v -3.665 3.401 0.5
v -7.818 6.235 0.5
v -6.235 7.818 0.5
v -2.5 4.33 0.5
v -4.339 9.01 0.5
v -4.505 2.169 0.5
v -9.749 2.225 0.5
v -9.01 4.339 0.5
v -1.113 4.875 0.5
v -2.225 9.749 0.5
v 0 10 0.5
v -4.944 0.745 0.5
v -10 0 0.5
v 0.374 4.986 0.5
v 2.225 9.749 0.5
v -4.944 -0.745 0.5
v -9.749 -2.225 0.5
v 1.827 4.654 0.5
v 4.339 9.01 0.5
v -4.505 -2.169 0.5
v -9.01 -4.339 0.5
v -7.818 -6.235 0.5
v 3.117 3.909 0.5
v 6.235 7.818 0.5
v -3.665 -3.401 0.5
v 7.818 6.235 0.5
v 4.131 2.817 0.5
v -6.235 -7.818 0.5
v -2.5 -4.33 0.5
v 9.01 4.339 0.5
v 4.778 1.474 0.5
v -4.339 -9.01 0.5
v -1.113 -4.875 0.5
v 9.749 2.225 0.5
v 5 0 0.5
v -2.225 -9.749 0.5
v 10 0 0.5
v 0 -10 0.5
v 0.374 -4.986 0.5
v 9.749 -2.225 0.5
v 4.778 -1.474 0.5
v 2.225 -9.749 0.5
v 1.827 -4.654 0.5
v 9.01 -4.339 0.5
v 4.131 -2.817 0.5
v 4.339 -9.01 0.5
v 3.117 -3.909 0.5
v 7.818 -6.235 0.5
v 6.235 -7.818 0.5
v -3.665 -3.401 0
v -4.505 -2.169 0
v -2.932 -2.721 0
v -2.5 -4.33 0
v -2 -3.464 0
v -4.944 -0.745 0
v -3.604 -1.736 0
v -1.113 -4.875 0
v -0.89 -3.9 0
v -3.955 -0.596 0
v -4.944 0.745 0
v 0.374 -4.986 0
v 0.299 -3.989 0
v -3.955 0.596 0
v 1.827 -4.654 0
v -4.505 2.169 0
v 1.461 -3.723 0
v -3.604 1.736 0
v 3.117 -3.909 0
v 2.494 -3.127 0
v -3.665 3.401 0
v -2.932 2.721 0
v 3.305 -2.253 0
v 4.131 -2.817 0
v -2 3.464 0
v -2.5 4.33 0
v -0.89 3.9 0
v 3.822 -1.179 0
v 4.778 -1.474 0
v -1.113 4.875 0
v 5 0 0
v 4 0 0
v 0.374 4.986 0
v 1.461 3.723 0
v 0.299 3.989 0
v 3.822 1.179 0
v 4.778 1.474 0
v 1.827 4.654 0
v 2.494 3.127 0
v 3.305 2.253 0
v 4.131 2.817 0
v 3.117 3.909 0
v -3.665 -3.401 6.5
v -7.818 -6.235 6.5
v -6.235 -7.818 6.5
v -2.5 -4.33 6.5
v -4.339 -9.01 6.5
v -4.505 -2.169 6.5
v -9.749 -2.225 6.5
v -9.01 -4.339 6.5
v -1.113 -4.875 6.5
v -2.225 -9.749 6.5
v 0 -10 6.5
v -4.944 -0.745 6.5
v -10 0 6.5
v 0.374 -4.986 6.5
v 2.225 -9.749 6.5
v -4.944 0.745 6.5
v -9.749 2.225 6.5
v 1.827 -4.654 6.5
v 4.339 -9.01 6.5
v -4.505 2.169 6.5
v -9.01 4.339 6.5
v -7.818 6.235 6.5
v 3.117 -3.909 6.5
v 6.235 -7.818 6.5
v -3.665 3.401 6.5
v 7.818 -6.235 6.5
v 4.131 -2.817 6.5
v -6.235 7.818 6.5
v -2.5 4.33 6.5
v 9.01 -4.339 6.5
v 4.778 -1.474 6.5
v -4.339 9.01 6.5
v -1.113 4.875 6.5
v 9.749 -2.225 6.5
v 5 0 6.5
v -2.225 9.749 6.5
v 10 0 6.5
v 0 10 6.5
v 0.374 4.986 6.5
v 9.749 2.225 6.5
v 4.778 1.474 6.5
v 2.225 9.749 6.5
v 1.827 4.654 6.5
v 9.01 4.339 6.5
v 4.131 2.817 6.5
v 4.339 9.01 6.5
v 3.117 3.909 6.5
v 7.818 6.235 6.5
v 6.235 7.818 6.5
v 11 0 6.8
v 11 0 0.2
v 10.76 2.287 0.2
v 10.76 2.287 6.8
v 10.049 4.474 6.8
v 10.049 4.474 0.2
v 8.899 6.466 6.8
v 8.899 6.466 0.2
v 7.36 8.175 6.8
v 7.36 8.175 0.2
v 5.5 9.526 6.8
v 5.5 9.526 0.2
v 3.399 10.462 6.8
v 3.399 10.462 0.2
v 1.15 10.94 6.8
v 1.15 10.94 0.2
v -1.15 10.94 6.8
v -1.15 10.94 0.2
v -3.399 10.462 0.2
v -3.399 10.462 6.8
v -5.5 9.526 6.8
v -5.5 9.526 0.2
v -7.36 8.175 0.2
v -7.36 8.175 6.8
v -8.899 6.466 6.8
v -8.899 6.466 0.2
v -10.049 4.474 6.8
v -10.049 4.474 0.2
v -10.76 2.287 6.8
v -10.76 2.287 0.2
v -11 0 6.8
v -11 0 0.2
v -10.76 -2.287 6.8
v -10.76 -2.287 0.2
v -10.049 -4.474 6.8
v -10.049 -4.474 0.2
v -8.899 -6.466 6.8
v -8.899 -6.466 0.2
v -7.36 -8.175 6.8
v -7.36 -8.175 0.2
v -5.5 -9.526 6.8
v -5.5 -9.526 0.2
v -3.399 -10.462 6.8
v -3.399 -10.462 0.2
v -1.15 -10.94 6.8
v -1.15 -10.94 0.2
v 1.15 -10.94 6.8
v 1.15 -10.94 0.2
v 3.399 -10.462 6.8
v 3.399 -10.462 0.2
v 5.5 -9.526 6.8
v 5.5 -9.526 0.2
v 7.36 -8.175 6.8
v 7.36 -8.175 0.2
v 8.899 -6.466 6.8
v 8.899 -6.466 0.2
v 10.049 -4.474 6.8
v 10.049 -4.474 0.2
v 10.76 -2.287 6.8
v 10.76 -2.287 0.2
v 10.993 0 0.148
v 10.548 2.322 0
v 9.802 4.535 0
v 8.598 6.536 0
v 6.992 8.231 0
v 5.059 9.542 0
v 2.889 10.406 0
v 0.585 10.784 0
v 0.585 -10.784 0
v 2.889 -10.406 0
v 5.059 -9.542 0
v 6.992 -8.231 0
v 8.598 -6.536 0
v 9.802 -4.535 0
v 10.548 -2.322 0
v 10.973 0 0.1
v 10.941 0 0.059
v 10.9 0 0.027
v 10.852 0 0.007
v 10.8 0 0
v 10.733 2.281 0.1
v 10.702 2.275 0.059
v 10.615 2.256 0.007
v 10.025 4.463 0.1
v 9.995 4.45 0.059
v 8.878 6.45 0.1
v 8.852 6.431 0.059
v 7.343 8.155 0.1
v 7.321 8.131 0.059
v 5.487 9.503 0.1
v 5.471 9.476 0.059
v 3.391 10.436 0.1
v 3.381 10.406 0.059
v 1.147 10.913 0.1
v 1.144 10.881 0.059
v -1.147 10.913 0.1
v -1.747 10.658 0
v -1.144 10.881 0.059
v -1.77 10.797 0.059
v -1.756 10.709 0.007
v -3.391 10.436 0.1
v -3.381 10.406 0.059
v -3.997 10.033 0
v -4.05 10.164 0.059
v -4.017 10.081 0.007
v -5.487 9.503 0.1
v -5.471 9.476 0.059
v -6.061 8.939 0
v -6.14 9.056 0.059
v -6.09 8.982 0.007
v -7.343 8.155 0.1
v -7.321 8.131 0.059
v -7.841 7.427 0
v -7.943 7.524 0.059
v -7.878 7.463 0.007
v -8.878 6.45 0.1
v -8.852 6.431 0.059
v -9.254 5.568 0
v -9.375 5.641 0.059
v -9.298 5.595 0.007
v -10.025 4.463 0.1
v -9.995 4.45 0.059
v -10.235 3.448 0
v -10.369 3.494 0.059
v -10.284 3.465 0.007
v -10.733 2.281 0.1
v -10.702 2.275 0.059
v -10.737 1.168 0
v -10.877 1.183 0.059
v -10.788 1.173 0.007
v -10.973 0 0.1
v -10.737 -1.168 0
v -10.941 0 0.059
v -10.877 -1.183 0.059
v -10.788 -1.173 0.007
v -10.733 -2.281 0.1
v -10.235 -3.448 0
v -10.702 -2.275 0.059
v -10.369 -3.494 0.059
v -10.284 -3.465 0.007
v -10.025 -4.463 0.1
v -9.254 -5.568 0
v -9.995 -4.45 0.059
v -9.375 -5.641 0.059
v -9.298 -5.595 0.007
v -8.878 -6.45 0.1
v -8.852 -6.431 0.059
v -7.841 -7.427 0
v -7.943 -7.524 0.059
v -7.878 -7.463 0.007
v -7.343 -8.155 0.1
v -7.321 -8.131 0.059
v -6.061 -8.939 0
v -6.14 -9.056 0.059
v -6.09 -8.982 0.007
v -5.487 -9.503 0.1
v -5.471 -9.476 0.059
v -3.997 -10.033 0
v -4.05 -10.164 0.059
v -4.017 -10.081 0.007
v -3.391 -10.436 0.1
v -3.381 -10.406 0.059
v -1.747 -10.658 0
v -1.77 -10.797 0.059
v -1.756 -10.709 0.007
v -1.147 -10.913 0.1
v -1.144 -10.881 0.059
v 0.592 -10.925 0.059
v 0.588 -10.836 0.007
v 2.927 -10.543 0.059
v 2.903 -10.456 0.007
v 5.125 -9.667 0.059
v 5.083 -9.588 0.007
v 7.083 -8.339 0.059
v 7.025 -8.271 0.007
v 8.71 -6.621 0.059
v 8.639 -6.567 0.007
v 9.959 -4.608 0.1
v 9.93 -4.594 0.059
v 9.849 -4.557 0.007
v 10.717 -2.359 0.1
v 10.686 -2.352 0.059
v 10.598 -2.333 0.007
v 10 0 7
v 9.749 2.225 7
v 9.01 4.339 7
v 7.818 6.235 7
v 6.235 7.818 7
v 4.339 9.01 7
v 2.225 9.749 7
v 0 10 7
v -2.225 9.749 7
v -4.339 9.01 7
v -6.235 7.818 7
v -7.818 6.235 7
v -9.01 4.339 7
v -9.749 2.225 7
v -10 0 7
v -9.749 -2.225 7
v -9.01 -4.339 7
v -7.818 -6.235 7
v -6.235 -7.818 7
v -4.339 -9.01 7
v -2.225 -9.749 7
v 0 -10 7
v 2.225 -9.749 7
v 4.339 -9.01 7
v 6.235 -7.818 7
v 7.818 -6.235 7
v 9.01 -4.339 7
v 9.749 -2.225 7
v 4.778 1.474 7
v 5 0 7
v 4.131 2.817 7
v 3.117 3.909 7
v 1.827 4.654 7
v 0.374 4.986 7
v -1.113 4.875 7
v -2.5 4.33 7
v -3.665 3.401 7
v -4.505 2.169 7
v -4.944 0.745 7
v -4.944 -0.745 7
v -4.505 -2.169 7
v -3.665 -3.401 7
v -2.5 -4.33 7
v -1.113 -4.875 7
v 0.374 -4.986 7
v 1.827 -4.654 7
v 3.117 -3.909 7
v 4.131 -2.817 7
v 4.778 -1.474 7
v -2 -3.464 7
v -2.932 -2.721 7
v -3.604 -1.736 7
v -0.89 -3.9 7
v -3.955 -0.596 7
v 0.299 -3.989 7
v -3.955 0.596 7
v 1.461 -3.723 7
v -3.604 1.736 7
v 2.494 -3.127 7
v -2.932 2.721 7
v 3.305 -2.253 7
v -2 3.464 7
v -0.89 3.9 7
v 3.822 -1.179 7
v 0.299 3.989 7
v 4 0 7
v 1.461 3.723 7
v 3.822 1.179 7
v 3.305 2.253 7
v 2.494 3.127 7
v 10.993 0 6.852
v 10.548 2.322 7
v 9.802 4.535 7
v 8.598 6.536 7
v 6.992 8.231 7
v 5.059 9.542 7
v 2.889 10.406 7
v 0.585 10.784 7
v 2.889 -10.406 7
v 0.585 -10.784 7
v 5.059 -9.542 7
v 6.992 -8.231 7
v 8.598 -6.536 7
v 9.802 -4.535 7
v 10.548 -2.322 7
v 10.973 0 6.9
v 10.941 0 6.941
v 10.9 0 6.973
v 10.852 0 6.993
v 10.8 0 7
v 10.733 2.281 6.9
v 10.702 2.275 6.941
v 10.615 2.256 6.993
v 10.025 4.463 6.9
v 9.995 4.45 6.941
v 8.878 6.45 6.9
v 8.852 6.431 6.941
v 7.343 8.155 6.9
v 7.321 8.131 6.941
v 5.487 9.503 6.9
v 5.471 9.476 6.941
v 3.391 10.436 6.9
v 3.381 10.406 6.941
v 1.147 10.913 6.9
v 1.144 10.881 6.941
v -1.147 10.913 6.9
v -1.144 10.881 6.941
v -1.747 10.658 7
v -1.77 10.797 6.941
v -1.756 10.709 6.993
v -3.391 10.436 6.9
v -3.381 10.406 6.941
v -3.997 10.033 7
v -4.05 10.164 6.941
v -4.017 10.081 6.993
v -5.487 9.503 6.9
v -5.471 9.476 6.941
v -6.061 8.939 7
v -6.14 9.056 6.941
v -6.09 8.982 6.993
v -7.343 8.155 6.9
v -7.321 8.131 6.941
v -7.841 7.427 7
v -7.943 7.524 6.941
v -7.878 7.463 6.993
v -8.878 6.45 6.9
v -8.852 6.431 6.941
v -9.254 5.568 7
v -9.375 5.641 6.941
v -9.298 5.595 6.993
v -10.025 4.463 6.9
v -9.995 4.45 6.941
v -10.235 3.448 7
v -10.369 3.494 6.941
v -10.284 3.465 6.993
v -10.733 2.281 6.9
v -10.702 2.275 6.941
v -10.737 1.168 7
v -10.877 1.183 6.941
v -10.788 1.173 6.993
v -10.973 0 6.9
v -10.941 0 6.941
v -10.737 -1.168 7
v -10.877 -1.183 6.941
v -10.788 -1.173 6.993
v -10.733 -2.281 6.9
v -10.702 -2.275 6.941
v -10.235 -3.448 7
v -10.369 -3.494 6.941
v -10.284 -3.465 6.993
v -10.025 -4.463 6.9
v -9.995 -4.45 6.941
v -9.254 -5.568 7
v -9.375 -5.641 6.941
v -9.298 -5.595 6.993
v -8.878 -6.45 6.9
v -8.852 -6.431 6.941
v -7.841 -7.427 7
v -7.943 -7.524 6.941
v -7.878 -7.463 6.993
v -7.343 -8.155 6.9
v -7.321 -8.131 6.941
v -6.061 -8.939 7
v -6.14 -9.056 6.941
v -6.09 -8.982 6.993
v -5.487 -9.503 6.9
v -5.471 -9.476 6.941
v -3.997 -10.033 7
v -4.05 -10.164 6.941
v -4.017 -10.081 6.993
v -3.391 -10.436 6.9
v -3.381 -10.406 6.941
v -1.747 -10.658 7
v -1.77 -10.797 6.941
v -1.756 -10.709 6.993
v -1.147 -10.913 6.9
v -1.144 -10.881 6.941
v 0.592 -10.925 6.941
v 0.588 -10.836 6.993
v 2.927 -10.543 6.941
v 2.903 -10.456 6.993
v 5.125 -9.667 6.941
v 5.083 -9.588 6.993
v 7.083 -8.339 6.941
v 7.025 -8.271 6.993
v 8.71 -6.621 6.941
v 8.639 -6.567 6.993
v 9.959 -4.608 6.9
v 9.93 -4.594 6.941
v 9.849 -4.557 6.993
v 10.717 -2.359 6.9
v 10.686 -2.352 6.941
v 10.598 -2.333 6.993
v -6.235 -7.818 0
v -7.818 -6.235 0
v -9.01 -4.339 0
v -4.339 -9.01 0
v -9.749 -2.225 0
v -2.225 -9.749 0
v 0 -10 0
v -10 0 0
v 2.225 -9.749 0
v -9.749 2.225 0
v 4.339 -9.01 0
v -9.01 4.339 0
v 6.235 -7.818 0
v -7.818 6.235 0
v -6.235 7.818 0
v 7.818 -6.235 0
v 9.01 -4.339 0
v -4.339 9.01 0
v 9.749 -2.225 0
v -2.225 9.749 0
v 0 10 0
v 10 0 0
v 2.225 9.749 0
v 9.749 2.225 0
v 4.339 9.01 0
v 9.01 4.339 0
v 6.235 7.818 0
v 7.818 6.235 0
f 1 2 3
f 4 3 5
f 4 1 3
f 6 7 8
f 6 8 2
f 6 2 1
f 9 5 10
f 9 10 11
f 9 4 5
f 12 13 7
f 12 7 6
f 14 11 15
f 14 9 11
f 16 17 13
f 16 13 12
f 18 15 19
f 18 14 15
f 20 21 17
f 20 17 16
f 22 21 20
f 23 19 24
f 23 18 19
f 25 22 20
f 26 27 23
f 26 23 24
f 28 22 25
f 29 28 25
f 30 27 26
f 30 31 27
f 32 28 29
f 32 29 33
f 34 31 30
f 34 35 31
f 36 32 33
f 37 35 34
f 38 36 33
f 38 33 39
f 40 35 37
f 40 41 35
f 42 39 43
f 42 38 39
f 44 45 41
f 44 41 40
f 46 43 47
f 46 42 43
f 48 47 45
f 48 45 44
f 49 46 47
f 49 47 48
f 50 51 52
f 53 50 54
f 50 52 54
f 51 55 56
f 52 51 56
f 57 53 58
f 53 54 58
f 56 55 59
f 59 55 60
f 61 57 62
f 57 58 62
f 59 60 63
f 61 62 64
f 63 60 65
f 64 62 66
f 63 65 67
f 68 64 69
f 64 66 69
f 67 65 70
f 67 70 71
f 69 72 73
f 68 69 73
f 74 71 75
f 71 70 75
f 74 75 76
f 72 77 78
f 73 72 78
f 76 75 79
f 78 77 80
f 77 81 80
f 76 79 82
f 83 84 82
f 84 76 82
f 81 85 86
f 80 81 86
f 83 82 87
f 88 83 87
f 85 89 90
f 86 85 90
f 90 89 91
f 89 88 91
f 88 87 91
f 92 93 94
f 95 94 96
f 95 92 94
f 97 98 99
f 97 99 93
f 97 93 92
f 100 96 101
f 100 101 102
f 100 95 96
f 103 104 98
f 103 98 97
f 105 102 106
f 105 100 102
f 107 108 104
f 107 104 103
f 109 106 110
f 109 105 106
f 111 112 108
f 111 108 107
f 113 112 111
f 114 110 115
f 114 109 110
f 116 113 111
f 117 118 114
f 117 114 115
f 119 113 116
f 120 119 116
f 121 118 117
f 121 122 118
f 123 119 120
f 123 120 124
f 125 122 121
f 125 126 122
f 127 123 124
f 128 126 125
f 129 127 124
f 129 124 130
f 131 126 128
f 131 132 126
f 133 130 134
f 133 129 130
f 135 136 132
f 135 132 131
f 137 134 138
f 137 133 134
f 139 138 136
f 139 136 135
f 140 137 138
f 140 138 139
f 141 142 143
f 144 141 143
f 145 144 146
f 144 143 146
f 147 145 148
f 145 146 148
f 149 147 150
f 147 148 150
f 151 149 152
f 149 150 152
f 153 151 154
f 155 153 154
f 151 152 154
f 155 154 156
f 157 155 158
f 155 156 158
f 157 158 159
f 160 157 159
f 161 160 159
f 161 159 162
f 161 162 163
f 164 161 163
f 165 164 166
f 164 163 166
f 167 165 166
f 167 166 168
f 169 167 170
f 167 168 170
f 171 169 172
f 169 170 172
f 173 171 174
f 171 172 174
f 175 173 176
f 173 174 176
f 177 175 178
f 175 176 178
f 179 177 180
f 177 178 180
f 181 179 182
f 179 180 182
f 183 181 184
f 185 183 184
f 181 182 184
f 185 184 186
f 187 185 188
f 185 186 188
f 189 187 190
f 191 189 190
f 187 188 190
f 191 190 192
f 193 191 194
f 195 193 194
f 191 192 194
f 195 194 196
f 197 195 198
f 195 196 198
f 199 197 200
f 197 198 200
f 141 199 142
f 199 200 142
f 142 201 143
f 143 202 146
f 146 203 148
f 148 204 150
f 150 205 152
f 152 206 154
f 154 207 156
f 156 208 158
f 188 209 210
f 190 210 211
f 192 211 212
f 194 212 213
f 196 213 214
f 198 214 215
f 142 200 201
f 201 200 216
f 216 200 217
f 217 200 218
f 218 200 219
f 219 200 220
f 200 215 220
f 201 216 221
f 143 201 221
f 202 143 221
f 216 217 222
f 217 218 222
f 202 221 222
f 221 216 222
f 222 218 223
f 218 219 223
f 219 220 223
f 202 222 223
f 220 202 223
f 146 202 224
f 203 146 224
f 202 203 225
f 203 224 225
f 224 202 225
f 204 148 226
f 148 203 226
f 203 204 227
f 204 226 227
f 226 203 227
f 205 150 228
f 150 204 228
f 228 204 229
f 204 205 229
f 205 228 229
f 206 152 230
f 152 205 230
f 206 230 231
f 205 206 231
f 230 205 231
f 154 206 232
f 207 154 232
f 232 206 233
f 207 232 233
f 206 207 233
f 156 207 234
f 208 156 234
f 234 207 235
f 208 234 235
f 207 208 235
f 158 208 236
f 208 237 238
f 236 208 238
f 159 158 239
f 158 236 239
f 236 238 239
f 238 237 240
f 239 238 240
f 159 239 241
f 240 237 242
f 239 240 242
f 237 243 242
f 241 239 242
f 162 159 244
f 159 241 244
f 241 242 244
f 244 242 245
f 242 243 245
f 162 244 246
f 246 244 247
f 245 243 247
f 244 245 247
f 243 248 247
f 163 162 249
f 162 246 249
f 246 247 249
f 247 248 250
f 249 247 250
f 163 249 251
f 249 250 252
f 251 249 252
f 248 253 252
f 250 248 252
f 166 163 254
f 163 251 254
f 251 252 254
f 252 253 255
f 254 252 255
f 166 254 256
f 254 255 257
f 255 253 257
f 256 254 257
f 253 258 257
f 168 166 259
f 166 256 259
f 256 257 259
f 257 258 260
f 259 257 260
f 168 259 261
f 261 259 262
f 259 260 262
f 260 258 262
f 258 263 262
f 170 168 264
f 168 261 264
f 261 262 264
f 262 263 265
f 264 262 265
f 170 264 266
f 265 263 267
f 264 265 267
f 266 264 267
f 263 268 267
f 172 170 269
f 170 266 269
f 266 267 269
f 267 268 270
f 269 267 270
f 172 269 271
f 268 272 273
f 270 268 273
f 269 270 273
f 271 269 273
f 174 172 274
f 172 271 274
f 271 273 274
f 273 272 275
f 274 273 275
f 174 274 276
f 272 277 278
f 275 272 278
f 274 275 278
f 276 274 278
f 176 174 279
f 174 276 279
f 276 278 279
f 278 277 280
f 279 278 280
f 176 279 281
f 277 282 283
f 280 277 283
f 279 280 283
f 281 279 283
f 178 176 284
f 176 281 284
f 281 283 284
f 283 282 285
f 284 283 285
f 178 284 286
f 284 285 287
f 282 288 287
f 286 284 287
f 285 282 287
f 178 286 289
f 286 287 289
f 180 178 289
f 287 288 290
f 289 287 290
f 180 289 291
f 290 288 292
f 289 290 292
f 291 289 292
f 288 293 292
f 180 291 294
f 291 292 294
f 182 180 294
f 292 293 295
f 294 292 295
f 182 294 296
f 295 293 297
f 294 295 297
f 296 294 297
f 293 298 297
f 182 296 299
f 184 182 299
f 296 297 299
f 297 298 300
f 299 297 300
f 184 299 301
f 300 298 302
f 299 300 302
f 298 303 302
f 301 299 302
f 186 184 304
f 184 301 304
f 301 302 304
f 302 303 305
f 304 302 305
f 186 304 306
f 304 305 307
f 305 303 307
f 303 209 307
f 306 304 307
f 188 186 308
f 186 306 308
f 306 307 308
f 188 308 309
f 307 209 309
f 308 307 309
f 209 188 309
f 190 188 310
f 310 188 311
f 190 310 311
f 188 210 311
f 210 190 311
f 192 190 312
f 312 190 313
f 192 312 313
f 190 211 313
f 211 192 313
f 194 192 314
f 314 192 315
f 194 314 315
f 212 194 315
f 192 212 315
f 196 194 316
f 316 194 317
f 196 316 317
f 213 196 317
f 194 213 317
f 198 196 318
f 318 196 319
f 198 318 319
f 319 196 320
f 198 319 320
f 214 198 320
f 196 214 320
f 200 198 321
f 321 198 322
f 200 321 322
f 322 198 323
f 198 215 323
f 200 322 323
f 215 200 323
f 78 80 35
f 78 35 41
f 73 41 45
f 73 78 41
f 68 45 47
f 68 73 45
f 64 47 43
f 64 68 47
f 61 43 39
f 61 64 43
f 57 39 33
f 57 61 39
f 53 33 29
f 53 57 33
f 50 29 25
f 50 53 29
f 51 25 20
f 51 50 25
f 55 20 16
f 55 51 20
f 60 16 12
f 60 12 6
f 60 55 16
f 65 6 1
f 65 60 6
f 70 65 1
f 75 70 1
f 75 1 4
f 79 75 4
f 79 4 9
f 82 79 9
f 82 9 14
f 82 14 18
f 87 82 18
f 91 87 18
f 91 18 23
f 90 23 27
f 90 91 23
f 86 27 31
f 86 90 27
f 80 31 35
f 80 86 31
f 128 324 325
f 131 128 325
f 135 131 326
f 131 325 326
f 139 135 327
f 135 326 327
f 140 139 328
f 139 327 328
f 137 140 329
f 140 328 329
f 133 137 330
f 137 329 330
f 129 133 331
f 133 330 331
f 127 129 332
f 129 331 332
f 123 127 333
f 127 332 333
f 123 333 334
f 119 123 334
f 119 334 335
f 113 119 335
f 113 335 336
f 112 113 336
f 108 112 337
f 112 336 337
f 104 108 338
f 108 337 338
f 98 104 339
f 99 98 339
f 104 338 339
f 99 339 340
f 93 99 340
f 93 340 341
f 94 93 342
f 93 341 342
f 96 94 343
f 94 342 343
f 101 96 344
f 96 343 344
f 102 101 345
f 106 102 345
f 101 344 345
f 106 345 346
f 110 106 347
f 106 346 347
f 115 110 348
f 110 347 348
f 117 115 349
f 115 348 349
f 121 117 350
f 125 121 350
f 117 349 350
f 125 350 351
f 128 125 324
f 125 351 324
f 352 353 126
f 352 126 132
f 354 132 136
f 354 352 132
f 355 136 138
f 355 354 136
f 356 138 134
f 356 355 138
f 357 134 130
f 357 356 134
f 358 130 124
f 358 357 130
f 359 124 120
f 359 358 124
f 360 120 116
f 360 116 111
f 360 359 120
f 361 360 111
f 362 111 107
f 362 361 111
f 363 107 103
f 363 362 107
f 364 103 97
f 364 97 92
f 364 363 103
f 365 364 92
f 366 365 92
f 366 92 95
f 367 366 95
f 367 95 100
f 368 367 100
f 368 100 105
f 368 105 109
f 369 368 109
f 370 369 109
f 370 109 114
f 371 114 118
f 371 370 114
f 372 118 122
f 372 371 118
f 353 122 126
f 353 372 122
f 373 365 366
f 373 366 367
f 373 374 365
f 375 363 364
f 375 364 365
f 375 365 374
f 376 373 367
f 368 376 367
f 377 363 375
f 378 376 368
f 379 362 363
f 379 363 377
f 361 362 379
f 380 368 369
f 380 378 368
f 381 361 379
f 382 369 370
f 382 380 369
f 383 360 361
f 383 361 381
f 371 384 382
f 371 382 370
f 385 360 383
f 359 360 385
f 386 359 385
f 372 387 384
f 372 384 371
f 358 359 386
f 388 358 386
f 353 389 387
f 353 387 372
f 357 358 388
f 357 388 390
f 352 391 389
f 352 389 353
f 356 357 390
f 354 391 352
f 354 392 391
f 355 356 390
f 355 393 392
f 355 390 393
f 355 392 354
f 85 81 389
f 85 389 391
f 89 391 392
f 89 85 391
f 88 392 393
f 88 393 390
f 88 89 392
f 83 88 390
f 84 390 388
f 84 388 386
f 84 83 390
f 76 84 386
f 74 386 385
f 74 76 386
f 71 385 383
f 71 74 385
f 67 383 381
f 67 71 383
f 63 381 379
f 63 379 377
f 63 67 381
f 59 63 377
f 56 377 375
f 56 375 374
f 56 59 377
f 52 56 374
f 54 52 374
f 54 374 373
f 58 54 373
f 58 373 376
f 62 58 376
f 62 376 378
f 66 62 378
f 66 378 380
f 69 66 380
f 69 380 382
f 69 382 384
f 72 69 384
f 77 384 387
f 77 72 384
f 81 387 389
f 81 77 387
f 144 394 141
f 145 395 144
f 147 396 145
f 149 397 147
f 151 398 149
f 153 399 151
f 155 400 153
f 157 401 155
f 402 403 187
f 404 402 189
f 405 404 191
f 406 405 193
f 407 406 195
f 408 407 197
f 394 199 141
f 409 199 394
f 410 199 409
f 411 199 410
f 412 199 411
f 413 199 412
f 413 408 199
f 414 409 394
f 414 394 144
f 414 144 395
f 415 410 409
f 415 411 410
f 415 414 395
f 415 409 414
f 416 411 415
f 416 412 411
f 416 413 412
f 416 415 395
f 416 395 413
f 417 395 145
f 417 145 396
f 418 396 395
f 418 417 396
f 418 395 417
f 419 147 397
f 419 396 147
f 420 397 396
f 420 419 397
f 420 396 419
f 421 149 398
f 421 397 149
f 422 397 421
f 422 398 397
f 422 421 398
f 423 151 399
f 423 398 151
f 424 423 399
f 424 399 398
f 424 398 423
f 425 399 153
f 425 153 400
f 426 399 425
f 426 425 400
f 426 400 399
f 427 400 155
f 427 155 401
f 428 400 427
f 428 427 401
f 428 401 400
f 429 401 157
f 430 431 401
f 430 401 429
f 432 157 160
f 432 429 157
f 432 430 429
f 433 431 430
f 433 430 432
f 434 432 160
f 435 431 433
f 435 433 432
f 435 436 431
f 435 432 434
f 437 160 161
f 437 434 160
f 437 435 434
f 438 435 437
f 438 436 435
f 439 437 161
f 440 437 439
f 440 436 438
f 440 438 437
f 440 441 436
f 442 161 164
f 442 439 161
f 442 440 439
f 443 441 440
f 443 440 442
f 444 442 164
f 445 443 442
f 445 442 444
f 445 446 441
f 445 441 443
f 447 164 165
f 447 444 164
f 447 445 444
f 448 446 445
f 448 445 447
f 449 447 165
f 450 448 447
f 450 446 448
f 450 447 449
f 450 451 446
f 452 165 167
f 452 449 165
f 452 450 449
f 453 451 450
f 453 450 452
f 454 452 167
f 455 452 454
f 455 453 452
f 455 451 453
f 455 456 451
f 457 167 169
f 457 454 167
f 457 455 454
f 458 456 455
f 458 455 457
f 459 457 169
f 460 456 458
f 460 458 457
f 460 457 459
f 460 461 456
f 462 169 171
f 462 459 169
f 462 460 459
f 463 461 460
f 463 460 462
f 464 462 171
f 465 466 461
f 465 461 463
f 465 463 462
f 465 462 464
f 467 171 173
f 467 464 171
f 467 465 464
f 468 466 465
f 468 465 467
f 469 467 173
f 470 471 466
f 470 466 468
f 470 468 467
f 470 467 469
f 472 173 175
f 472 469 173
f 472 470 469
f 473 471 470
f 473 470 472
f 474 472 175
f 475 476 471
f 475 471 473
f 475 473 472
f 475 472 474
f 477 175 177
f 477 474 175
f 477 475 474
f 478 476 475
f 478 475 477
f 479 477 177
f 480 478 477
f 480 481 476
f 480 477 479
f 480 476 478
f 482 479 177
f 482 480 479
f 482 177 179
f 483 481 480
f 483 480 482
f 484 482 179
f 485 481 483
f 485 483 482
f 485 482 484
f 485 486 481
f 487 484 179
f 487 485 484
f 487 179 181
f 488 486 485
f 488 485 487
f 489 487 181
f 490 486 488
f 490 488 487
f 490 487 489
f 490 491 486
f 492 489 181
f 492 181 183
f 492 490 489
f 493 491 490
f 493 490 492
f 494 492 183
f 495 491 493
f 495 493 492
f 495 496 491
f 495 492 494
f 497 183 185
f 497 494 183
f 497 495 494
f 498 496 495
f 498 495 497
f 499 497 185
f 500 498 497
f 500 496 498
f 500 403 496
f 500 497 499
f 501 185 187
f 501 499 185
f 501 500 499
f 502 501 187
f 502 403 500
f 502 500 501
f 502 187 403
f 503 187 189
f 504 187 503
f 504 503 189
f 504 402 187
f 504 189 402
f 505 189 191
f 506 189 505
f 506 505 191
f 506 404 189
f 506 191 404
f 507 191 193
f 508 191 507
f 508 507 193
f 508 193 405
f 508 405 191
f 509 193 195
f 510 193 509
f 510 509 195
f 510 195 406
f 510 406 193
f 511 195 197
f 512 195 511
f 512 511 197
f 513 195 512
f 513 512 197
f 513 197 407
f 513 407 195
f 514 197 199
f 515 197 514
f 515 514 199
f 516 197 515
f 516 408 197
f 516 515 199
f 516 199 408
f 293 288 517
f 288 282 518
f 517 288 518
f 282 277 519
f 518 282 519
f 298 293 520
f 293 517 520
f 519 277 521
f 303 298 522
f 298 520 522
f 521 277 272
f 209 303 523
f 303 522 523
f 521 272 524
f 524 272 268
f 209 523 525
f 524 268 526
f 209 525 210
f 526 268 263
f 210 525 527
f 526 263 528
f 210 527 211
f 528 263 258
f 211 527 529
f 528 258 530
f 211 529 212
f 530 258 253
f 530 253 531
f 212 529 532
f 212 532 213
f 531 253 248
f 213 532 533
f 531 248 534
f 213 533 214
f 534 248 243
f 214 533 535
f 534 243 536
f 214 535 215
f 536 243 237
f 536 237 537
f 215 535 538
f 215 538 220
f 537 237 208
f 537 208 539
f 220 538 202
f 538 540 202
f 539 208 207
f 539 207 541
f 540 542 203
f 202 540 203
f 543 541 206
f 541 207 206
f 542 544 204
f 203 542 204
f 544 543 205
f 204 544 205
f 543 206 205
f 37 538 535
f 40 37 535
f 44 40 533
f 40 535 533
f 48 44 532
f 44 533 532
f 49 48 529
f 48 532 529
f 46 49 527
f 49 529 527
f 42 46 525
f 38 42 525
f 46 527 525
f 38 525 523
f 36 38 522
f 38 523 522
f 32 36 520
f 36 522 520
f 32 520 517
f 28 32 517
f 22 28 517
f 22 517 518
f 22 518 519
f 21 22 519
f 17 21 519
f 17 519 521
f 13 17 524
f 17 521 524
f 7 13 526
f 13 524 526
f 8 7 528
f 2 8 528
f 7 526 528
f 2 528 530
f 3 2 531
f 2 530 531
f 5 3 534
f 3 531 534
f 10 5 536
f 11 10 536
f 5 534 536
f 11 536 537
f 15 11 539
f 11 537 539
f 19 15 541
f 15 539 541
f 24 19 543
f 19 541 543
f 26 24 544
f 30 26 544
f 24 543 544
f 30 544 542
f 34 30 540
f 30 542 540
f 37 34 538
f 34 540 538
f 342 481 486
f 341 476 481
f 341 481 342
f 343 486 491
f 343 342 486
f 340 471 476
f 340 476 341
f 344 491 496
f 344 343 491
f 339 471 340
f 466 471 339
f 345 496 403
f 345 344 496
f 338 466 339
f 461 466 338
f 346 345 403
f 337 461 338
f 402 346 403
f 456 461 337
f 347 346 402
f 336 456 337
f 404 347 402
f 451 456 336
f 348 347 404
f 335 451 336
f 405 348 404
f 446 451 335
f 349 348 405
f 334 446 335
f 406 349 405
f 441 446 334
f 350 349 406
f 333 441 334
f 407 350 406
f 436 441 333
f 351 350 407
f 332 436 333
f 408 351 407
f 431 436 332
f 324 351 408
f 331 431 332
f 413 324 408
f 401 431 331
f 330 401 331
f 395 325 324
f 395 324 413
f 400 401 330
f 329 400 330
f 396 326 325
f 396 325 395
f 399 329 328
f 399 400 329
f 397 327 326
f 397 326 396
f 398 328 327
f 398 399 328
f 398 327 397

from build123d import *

# Parameters (mm, degrees)
F0_R     = 11
F0_R_2   = 4
F1_DEPTH = 7
F2_R     = 10
F2_R_2   = 5
F3_DEPTH = 0.5
F4_R     = 10
F4_R_2   = 5
F5_DEPTH = 0.5
F6_R     = 0.2


with BuildPart() as f1:
    # F0 (on Top) → F1 (new body)
    with BuildSketch(Plane.XY):
        Circle(F0_R)
        Circle(F0_R_2, mode=Mode.SUBTRACT)
    extrude(amount=F1_DEPTH)

    # F2 (on face) → F3 (cut)
    with BuildSketch(Plane(origin=(0, 0, 0), x_dir=(1, 0, 0), z_dir=(0, 0, -1))):
        Circle(F2_R)
        Circle(F2_R_2, mode=Mode.SUBTRACT)
    extrude(amount=-F3_DEPTH, mode=Mode.SUBTRACT)

    # F4 (on face) → F5 (cut)
    with BuildSketch(Plane.XY.offset(7)):
        Circle(F4_R)
        Circle(F4_R_2, mode=Mode.SUBTRACT)
    extrude(amount=-F5_DEPTH, mode=Mode.SUBTRACT)

    # F6
    f6_edges = [f1.edges().sort_by_distance(p)[0] for p in [
        (-11, 0, 0),
        (-11, 0, 7),
    ]]
    fillet(f6_edges, radius=F6_R)


solid = f1.part
